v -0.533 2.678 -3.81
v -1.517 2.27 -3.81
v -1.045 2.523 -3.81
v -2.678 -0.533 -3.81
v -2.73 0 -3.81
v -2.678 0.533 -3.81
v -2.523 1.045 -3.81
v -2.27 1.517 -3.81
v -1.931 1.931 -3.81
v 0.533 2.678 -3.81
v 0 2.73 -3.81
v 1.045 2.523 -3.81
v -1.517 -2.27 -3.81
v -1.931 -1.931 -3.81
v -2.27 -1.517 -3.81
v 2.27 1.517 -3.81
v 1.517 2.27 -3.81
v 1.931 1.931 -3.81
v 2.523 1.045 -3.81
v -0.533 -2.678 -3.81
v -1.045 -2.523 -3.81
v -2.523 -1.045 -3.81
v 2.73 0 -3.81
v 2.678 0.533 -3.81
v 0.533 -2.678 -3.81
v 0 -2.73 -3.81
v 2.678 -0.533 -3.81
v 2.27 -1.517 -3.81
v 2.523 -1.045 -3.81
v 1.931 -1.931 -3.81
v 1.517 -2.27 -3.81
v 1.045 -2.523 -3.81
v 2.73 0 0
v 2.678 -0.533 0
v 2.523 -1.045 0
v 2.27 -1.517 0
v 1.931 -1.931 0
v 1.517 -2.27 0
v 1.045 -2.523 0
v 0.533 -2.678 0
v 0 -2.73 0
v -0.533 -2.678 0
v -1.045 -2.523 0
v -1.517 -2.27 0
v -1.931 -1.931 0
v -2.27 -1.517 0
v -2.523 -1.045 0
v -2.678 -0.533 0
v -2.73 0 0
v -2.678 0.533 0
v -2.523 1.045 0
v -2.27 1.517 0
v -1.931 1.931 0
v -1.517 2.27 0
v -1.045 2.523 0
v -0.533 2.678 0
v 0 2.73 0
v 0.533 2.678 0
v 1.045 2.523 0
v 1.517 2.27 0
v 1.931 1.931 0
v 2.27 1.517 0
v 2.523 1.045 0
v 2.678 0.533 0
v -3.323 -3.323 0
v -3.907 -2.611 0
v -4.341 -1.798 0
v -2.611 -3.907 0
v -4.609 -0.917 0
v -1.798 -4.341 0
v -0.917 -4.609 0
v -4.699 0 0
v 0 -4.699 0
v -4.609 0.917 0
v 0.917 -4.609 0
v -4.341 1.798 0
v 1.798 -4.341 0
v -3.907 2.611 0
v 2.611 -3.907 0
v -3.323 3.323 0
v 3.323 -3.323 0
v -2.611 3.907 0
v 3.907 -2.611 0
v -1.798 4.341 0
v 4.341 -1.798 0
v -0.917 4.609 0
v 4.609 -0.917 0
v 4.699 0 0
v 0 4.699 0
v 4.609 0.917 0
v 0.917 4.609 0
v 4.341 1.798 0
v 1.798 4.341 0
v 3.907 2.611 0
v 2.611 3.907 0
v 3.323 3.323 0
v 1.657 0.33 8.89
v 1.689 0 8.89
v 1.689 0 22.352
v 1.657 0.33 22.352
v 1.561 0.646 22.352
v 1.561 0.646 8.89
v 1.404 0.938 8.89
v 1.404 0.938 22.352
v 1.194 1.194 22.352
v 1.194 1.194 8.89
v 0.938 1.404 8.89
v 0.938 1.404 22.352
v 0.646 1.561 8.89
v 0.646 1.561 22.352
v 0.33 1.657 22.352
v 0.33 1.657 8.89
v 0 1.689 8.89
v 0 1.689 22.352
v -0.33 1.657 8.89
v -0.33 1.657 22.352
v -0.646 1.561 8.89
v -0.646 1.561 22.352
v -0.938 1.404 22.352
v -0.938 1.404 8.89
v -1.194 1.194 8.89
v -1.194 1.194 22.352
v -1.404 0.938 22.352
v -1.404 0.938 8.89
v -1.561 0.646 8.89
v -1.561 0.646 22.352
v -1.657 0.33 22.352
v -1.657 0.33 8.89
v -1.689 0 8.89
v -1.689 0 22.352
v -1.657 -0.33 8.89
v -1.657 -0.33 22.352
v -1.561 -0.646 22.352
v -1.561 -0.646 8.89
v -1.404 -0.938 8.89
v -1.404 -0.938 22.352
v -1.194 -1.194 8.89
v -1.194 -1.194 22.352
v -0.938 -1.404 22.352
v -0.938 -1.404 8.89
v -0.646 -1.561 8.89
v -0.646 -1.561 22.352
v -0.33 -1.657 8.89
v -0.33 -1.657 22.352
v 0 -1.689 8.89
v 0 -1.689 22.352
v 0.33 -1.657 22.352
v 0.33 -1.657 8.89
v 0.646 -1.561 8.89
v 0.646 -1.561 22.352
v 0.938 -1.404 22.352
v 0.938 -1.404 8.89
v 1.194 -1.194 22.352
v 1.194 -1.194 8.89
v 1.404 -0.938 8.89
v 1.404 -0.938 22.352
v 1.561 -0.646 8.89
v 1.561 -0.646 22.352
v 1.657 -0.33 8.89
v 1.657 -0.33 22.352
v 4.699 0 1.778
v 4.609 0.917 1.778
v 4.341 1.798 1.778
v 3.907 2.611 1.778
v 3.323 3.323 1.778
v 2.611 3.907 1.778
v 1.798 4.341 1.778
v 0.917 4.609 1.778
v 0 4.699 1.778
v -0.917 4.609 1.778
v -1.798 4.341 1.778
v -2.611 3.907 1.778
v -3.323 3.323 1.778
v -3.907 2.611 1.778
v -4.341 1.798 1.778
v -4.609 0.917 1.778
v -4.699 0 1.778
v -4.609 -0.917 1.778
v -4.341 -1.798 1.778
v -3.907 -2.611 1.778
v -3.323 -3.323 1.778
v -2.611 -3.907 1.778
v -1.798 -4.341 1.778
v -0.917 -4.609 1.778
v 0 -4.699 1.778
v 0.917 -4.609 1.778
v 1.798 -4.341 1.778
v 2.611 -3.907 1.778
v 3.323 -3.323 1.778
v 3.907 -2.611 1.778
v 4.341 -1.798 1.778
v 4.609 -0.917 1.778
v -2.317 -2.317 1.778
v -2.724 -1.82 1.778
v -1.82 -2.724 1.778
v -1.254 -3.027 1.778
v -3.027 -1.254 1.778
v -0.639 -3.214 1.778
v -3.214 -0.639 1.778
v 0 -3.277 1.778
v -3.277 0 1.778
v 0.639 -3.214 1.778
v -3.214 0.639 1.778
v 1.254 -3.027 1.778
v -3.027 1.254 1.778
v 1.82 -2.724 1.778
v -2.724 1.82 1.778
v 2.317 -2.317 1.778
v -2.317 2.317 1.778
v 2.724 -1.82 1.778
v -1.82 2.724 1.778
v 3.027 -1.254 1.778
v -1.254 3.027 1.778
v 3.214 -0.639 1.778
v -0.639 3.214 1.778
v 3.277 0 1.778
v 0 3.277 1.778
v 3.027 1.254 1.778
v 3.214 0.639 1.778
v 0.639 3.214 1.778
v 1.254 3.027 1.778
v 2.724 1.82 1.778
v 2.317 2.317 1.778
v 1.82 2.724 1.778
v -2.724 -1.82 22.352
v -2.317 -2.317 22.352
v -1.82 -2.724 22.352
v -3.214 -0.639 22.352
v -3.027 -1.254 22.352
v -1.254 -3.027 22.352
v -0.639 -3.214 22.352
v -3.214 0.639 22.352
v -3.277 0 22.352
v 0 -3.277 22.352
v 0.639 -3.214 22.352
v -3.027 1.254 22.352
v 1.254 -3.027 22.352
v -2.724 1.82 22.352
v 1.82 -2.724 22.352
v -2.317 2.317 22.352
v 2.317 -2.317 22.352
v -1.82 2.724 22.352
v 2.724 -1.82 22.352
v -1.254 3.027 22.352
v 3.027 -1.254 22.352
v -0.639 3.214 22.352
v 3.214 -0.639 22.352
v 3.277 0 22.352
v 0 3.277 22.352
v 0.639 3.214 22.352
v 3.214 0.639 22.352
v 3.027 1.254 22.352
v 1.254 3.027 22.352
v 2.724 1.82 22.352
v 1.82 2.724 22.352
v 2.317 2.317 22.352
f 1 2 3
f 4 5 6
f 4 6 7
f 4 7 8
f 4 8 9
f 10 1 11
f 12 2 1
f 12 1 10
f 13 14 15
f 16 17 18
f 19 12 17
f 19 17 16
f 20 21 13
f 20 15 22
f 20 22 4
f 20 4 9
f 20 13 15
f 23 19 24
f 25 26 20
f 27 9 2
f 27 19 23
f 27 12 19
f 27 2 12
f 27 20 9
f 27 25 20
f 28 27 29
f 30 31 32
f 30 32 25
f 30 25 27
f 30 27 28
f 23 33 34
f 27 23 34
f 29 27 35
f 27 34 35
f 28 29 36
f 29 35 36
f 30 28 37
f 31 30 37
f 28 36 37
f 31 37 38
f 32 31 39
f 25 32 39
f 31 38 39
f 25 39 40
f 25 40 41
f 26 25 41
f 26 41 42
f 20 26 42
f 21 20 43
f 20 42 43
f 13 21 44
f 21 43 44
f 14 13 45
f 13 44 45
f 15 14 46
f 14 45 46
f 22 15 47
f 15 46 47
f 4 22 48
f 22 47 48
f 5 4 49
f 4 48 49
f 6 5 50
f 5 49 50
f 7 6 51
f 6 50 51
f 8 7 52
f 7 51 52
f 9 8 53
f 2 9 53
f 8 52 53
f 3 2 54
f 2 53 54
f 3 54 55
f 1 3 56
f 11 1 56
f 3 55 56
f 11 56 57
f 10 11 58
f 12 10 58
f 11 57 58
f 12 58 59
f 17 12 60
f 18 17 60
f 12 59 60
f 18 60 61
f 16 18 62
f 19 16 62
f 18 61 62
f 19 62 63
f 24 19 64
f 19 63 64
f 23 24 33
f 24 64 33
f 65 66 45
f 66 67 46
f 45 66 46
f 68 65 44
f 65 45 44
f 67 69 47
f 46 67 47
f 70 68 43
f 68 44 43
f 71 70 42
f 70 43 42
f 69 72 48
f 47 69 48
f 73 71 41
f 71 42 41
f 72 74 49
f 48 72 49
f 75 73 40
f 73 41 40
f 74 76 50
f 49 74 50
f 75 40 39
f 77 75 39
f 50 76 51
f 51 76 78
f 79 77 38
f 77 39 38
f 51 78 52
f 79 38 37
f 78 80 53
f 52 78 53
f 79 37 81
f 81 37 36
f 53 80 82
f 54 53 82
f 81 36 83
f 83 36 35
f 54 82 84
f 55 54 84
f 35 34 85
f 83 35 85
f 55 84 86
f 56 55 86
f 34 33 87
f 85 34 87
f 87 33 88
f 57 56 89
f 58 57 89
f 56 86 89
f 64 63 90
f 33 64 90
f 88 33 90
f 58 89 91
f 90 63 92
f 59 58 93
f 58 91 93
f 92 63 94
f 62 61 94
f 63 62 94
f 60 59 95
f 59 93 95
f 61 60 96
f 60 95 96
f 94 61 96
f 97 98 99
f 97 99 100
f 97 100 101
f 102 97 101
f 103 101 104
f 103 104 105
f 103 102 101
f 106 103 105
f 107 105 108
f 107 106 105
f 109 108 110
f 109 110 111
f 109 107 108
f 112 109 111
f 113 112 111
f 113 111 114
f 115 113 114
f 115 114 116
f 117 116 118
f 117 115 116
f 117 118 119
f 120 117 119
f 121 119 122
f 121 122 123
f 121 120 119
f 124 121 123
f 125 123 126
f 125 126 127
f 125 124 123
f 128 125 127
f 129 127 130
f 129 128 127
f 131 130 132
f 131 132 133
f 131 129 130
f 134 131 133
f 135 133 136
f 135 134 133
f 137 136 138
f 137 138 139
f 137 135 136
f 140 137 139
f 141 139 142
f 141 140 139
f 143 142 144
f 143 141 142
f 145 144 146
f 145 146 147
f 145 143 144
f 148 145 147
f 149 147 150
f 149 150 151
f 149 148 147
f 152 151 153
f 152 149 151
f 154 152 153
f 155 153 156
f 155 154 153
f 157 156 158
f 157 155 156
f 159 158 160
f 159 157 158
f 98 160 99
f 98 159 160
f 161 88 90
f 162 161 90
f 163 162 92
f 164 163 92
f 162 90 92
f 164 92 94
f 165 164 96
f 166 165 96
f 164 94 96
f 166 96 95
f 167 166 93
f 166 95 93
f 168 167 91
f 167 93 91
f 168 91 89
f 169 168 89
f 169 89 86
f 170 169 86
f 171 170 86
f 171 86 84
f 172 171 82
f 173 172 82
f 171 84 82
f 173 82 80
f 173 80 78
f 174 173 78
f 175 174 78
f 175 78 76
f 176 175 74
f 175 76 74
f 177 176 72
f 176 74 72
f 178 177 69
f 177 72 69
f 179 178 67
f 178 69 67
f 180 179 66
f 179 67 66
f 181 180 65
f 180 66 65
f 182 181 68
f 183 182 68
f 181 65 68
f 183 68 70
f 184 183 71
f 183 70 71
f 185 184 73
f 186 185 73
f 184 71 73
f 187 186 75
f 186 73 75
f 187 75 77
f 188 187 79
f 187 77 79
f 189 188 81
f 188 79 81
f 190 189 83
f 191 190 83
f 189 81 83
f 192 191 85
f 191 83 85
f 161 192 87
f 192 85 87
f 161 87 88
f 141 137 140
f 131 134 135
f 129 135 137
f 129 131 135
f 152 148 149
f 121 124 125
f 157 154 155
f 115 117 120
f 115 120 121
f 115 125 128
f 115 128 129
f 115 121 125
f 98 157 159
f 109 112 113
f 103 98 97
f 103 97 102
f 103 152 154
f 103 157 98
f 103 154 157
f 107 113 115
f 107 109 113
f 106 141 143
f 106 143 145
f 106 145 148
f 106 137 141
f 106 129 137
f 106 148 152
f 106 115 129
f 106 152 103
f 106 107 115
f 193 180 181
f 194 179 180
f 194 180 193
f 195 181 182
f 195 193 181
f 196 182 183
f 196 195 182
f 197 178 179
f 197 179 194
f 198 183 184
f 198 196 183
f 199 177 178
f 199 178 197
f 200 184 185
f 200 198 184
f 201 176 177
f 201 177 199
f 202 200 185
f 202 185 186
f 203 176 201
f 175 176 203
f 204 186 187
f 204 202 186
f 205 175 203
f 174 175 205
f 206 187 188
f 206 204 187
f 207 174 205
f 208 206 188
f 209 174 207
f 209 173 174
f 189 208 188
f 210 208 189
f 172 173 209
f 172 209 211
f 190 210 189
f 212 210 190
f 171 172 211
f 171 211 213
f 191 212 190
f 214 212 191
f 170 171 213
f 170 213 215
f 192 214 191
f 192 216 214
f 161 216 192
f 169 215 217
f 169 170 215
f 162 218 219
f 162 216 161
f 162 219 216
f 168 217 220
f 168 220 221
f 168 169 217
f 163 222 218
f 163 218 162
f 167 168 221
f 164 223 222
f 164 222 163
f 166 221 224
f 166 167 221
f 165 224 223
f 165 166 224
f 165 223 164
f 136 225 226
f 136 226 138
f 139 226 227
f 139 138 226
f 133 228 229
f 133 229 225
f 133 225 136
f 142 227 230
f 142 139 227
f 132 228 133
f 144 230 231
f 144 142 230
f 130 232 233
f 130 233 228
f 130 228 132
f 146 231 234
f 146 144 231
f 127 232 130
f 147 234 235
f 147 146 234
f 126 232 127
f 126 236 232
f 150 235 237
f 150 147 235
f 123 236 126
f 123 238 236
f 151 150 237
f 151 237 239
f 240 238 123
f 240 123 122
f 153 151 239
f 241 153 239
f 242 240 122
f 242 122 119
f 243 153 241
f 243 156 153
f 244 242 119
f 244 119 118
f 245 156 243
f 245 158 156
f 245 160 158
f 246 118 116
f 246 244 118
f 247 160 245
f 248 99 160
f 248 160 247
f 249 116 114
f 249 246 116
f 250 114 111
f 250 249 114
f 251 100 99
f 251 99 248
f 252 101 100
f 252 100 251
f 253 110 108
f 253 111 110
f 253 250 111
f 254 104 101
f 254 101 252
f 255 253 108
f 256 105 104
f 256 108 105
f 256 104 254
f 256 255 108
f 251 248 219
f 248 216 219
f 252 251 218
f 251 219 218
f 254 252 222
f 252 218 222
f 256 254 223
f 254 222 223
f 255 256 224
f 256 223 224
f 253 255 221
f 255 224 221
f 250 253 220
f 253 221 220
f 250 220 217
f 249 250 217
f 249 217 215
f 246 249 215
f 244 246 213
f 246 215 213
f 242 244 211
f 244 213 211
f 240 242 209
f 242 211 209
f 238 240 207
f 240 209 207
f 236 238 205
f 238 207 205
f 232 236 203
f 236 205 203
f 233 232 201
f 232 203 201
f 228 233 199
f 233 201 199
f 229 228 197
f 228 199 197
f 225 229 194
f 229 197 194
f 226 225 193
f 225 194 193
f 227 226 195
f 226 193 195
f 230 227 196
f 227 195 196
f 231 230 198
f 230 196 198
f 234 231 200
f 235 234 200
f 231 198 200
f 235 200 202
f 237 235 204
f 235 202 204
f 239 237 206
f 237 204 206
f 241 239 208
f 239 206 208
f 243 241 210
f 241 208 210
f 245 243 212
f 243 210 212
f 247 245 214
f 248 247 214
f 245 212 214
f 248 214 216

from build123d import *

# Parameters (mm, degrees)
F0_R     = 3.2766
F1_DEPTH = 8.89
F2_R     = 4.699
F3_DEPTH = 1.778
F4_R     = 2.7305
F5_DEPTH = 3.81
F6_R     = 3.2766
F6_R_2   = 1.6891
F7_DEPTH = 13.462


with BuildPart() as f1:
    # F0 (on Top) → F1 (new body)
    with BuildSketch(Plane.XY):
        Circle(F0_R)
    extrude(amount=F1_DEPTH)

    # F2 (on Top) → F3 (join)
    with BuildSketch(Plane.XY):
        Circle(F2_R)
    extrude(amount=F3_DEPTH)

    # F4 (on face) → F5 (join)
    with BuildSketch(Plane(origin=(0, 0, 0), x_dir=(1, 0, 0), z_dir=(0, 0, -1))):
        Circle(F4_R)
    extrude(amount=F5_DEPTH)

    # F6 (on face) → F7 (join)
    with BuildSketch(Plane.XY.offset(8.89)):
        Circle(F6_R)
        Circle(F6_R_2, mode=Mode.SUBTRACT)
    extrude(amount=F7_DEPTH)


solid = f1.part
